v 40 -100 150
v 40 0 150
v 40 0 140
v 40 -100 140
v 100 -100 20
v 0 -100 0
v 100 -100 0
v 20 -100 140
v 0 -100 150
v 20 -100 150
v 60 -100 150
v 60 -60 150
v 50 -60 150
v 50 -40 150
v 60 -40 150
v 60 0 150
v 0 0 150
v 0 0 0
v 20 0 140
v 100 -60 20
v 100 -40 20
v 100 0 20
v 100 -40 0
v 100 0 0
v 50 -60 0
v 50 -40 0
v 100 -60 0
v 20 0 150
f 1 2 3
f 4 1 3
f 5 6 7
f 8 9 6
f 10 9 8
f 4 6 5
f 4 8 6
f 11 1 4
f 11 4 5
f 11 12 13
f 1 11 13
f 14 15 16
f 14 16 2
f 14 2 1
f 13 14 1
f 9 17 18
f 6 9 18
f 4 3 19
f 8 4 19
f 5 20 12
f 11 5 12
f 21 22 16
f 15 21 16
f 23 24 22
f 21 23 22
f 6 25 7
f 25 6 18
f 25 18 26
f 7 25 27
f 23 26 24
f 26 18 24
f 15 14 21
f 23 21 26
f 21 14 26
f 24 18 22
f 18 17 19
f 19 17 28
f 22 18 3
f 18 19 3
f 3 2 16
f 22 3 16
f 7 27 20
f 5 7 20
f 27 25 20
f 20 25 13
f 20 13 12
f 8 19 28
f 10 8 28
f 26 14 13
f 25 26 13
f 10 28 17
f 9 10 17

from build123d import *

# Parameters (mm, degrees)
F1_DEPTH = 100
F4_DEPTH = 150
F5_DEPTH = 100


with BuildPart() as f1:
    # F0 (on Front) → F1 (new body)
    with BuildSketch(Plane.XZ):
        Polygon((0, 150), (0, 0), (100, 0), (100, 20), (60, 150), (40, 150), (40, 140), (20, 140), (20, 150), align=None)
    extrude(amount=F1_DEPTH)

    # F3 (on face) → F4 (cut)
    with BuildSketch(Plane.XY.offset(150)):
        Polygon((60, -60), (60, -50), (60, -40), (50, -40), (50, -60), align=None)
    extrude(amount=-F4_DEPTH, mode=Mode.SUBTRACT)

    # F5 (cut): a face of the model
    f5_faces = [f1.faces().sort_by_distance(p)[0] for p in [
        (60, -50, 75),
    ]]
    extrude(f5_faces, amount=-F5_DEPTH, mode=Mode.SUBTRACT)


solid = f1.part
